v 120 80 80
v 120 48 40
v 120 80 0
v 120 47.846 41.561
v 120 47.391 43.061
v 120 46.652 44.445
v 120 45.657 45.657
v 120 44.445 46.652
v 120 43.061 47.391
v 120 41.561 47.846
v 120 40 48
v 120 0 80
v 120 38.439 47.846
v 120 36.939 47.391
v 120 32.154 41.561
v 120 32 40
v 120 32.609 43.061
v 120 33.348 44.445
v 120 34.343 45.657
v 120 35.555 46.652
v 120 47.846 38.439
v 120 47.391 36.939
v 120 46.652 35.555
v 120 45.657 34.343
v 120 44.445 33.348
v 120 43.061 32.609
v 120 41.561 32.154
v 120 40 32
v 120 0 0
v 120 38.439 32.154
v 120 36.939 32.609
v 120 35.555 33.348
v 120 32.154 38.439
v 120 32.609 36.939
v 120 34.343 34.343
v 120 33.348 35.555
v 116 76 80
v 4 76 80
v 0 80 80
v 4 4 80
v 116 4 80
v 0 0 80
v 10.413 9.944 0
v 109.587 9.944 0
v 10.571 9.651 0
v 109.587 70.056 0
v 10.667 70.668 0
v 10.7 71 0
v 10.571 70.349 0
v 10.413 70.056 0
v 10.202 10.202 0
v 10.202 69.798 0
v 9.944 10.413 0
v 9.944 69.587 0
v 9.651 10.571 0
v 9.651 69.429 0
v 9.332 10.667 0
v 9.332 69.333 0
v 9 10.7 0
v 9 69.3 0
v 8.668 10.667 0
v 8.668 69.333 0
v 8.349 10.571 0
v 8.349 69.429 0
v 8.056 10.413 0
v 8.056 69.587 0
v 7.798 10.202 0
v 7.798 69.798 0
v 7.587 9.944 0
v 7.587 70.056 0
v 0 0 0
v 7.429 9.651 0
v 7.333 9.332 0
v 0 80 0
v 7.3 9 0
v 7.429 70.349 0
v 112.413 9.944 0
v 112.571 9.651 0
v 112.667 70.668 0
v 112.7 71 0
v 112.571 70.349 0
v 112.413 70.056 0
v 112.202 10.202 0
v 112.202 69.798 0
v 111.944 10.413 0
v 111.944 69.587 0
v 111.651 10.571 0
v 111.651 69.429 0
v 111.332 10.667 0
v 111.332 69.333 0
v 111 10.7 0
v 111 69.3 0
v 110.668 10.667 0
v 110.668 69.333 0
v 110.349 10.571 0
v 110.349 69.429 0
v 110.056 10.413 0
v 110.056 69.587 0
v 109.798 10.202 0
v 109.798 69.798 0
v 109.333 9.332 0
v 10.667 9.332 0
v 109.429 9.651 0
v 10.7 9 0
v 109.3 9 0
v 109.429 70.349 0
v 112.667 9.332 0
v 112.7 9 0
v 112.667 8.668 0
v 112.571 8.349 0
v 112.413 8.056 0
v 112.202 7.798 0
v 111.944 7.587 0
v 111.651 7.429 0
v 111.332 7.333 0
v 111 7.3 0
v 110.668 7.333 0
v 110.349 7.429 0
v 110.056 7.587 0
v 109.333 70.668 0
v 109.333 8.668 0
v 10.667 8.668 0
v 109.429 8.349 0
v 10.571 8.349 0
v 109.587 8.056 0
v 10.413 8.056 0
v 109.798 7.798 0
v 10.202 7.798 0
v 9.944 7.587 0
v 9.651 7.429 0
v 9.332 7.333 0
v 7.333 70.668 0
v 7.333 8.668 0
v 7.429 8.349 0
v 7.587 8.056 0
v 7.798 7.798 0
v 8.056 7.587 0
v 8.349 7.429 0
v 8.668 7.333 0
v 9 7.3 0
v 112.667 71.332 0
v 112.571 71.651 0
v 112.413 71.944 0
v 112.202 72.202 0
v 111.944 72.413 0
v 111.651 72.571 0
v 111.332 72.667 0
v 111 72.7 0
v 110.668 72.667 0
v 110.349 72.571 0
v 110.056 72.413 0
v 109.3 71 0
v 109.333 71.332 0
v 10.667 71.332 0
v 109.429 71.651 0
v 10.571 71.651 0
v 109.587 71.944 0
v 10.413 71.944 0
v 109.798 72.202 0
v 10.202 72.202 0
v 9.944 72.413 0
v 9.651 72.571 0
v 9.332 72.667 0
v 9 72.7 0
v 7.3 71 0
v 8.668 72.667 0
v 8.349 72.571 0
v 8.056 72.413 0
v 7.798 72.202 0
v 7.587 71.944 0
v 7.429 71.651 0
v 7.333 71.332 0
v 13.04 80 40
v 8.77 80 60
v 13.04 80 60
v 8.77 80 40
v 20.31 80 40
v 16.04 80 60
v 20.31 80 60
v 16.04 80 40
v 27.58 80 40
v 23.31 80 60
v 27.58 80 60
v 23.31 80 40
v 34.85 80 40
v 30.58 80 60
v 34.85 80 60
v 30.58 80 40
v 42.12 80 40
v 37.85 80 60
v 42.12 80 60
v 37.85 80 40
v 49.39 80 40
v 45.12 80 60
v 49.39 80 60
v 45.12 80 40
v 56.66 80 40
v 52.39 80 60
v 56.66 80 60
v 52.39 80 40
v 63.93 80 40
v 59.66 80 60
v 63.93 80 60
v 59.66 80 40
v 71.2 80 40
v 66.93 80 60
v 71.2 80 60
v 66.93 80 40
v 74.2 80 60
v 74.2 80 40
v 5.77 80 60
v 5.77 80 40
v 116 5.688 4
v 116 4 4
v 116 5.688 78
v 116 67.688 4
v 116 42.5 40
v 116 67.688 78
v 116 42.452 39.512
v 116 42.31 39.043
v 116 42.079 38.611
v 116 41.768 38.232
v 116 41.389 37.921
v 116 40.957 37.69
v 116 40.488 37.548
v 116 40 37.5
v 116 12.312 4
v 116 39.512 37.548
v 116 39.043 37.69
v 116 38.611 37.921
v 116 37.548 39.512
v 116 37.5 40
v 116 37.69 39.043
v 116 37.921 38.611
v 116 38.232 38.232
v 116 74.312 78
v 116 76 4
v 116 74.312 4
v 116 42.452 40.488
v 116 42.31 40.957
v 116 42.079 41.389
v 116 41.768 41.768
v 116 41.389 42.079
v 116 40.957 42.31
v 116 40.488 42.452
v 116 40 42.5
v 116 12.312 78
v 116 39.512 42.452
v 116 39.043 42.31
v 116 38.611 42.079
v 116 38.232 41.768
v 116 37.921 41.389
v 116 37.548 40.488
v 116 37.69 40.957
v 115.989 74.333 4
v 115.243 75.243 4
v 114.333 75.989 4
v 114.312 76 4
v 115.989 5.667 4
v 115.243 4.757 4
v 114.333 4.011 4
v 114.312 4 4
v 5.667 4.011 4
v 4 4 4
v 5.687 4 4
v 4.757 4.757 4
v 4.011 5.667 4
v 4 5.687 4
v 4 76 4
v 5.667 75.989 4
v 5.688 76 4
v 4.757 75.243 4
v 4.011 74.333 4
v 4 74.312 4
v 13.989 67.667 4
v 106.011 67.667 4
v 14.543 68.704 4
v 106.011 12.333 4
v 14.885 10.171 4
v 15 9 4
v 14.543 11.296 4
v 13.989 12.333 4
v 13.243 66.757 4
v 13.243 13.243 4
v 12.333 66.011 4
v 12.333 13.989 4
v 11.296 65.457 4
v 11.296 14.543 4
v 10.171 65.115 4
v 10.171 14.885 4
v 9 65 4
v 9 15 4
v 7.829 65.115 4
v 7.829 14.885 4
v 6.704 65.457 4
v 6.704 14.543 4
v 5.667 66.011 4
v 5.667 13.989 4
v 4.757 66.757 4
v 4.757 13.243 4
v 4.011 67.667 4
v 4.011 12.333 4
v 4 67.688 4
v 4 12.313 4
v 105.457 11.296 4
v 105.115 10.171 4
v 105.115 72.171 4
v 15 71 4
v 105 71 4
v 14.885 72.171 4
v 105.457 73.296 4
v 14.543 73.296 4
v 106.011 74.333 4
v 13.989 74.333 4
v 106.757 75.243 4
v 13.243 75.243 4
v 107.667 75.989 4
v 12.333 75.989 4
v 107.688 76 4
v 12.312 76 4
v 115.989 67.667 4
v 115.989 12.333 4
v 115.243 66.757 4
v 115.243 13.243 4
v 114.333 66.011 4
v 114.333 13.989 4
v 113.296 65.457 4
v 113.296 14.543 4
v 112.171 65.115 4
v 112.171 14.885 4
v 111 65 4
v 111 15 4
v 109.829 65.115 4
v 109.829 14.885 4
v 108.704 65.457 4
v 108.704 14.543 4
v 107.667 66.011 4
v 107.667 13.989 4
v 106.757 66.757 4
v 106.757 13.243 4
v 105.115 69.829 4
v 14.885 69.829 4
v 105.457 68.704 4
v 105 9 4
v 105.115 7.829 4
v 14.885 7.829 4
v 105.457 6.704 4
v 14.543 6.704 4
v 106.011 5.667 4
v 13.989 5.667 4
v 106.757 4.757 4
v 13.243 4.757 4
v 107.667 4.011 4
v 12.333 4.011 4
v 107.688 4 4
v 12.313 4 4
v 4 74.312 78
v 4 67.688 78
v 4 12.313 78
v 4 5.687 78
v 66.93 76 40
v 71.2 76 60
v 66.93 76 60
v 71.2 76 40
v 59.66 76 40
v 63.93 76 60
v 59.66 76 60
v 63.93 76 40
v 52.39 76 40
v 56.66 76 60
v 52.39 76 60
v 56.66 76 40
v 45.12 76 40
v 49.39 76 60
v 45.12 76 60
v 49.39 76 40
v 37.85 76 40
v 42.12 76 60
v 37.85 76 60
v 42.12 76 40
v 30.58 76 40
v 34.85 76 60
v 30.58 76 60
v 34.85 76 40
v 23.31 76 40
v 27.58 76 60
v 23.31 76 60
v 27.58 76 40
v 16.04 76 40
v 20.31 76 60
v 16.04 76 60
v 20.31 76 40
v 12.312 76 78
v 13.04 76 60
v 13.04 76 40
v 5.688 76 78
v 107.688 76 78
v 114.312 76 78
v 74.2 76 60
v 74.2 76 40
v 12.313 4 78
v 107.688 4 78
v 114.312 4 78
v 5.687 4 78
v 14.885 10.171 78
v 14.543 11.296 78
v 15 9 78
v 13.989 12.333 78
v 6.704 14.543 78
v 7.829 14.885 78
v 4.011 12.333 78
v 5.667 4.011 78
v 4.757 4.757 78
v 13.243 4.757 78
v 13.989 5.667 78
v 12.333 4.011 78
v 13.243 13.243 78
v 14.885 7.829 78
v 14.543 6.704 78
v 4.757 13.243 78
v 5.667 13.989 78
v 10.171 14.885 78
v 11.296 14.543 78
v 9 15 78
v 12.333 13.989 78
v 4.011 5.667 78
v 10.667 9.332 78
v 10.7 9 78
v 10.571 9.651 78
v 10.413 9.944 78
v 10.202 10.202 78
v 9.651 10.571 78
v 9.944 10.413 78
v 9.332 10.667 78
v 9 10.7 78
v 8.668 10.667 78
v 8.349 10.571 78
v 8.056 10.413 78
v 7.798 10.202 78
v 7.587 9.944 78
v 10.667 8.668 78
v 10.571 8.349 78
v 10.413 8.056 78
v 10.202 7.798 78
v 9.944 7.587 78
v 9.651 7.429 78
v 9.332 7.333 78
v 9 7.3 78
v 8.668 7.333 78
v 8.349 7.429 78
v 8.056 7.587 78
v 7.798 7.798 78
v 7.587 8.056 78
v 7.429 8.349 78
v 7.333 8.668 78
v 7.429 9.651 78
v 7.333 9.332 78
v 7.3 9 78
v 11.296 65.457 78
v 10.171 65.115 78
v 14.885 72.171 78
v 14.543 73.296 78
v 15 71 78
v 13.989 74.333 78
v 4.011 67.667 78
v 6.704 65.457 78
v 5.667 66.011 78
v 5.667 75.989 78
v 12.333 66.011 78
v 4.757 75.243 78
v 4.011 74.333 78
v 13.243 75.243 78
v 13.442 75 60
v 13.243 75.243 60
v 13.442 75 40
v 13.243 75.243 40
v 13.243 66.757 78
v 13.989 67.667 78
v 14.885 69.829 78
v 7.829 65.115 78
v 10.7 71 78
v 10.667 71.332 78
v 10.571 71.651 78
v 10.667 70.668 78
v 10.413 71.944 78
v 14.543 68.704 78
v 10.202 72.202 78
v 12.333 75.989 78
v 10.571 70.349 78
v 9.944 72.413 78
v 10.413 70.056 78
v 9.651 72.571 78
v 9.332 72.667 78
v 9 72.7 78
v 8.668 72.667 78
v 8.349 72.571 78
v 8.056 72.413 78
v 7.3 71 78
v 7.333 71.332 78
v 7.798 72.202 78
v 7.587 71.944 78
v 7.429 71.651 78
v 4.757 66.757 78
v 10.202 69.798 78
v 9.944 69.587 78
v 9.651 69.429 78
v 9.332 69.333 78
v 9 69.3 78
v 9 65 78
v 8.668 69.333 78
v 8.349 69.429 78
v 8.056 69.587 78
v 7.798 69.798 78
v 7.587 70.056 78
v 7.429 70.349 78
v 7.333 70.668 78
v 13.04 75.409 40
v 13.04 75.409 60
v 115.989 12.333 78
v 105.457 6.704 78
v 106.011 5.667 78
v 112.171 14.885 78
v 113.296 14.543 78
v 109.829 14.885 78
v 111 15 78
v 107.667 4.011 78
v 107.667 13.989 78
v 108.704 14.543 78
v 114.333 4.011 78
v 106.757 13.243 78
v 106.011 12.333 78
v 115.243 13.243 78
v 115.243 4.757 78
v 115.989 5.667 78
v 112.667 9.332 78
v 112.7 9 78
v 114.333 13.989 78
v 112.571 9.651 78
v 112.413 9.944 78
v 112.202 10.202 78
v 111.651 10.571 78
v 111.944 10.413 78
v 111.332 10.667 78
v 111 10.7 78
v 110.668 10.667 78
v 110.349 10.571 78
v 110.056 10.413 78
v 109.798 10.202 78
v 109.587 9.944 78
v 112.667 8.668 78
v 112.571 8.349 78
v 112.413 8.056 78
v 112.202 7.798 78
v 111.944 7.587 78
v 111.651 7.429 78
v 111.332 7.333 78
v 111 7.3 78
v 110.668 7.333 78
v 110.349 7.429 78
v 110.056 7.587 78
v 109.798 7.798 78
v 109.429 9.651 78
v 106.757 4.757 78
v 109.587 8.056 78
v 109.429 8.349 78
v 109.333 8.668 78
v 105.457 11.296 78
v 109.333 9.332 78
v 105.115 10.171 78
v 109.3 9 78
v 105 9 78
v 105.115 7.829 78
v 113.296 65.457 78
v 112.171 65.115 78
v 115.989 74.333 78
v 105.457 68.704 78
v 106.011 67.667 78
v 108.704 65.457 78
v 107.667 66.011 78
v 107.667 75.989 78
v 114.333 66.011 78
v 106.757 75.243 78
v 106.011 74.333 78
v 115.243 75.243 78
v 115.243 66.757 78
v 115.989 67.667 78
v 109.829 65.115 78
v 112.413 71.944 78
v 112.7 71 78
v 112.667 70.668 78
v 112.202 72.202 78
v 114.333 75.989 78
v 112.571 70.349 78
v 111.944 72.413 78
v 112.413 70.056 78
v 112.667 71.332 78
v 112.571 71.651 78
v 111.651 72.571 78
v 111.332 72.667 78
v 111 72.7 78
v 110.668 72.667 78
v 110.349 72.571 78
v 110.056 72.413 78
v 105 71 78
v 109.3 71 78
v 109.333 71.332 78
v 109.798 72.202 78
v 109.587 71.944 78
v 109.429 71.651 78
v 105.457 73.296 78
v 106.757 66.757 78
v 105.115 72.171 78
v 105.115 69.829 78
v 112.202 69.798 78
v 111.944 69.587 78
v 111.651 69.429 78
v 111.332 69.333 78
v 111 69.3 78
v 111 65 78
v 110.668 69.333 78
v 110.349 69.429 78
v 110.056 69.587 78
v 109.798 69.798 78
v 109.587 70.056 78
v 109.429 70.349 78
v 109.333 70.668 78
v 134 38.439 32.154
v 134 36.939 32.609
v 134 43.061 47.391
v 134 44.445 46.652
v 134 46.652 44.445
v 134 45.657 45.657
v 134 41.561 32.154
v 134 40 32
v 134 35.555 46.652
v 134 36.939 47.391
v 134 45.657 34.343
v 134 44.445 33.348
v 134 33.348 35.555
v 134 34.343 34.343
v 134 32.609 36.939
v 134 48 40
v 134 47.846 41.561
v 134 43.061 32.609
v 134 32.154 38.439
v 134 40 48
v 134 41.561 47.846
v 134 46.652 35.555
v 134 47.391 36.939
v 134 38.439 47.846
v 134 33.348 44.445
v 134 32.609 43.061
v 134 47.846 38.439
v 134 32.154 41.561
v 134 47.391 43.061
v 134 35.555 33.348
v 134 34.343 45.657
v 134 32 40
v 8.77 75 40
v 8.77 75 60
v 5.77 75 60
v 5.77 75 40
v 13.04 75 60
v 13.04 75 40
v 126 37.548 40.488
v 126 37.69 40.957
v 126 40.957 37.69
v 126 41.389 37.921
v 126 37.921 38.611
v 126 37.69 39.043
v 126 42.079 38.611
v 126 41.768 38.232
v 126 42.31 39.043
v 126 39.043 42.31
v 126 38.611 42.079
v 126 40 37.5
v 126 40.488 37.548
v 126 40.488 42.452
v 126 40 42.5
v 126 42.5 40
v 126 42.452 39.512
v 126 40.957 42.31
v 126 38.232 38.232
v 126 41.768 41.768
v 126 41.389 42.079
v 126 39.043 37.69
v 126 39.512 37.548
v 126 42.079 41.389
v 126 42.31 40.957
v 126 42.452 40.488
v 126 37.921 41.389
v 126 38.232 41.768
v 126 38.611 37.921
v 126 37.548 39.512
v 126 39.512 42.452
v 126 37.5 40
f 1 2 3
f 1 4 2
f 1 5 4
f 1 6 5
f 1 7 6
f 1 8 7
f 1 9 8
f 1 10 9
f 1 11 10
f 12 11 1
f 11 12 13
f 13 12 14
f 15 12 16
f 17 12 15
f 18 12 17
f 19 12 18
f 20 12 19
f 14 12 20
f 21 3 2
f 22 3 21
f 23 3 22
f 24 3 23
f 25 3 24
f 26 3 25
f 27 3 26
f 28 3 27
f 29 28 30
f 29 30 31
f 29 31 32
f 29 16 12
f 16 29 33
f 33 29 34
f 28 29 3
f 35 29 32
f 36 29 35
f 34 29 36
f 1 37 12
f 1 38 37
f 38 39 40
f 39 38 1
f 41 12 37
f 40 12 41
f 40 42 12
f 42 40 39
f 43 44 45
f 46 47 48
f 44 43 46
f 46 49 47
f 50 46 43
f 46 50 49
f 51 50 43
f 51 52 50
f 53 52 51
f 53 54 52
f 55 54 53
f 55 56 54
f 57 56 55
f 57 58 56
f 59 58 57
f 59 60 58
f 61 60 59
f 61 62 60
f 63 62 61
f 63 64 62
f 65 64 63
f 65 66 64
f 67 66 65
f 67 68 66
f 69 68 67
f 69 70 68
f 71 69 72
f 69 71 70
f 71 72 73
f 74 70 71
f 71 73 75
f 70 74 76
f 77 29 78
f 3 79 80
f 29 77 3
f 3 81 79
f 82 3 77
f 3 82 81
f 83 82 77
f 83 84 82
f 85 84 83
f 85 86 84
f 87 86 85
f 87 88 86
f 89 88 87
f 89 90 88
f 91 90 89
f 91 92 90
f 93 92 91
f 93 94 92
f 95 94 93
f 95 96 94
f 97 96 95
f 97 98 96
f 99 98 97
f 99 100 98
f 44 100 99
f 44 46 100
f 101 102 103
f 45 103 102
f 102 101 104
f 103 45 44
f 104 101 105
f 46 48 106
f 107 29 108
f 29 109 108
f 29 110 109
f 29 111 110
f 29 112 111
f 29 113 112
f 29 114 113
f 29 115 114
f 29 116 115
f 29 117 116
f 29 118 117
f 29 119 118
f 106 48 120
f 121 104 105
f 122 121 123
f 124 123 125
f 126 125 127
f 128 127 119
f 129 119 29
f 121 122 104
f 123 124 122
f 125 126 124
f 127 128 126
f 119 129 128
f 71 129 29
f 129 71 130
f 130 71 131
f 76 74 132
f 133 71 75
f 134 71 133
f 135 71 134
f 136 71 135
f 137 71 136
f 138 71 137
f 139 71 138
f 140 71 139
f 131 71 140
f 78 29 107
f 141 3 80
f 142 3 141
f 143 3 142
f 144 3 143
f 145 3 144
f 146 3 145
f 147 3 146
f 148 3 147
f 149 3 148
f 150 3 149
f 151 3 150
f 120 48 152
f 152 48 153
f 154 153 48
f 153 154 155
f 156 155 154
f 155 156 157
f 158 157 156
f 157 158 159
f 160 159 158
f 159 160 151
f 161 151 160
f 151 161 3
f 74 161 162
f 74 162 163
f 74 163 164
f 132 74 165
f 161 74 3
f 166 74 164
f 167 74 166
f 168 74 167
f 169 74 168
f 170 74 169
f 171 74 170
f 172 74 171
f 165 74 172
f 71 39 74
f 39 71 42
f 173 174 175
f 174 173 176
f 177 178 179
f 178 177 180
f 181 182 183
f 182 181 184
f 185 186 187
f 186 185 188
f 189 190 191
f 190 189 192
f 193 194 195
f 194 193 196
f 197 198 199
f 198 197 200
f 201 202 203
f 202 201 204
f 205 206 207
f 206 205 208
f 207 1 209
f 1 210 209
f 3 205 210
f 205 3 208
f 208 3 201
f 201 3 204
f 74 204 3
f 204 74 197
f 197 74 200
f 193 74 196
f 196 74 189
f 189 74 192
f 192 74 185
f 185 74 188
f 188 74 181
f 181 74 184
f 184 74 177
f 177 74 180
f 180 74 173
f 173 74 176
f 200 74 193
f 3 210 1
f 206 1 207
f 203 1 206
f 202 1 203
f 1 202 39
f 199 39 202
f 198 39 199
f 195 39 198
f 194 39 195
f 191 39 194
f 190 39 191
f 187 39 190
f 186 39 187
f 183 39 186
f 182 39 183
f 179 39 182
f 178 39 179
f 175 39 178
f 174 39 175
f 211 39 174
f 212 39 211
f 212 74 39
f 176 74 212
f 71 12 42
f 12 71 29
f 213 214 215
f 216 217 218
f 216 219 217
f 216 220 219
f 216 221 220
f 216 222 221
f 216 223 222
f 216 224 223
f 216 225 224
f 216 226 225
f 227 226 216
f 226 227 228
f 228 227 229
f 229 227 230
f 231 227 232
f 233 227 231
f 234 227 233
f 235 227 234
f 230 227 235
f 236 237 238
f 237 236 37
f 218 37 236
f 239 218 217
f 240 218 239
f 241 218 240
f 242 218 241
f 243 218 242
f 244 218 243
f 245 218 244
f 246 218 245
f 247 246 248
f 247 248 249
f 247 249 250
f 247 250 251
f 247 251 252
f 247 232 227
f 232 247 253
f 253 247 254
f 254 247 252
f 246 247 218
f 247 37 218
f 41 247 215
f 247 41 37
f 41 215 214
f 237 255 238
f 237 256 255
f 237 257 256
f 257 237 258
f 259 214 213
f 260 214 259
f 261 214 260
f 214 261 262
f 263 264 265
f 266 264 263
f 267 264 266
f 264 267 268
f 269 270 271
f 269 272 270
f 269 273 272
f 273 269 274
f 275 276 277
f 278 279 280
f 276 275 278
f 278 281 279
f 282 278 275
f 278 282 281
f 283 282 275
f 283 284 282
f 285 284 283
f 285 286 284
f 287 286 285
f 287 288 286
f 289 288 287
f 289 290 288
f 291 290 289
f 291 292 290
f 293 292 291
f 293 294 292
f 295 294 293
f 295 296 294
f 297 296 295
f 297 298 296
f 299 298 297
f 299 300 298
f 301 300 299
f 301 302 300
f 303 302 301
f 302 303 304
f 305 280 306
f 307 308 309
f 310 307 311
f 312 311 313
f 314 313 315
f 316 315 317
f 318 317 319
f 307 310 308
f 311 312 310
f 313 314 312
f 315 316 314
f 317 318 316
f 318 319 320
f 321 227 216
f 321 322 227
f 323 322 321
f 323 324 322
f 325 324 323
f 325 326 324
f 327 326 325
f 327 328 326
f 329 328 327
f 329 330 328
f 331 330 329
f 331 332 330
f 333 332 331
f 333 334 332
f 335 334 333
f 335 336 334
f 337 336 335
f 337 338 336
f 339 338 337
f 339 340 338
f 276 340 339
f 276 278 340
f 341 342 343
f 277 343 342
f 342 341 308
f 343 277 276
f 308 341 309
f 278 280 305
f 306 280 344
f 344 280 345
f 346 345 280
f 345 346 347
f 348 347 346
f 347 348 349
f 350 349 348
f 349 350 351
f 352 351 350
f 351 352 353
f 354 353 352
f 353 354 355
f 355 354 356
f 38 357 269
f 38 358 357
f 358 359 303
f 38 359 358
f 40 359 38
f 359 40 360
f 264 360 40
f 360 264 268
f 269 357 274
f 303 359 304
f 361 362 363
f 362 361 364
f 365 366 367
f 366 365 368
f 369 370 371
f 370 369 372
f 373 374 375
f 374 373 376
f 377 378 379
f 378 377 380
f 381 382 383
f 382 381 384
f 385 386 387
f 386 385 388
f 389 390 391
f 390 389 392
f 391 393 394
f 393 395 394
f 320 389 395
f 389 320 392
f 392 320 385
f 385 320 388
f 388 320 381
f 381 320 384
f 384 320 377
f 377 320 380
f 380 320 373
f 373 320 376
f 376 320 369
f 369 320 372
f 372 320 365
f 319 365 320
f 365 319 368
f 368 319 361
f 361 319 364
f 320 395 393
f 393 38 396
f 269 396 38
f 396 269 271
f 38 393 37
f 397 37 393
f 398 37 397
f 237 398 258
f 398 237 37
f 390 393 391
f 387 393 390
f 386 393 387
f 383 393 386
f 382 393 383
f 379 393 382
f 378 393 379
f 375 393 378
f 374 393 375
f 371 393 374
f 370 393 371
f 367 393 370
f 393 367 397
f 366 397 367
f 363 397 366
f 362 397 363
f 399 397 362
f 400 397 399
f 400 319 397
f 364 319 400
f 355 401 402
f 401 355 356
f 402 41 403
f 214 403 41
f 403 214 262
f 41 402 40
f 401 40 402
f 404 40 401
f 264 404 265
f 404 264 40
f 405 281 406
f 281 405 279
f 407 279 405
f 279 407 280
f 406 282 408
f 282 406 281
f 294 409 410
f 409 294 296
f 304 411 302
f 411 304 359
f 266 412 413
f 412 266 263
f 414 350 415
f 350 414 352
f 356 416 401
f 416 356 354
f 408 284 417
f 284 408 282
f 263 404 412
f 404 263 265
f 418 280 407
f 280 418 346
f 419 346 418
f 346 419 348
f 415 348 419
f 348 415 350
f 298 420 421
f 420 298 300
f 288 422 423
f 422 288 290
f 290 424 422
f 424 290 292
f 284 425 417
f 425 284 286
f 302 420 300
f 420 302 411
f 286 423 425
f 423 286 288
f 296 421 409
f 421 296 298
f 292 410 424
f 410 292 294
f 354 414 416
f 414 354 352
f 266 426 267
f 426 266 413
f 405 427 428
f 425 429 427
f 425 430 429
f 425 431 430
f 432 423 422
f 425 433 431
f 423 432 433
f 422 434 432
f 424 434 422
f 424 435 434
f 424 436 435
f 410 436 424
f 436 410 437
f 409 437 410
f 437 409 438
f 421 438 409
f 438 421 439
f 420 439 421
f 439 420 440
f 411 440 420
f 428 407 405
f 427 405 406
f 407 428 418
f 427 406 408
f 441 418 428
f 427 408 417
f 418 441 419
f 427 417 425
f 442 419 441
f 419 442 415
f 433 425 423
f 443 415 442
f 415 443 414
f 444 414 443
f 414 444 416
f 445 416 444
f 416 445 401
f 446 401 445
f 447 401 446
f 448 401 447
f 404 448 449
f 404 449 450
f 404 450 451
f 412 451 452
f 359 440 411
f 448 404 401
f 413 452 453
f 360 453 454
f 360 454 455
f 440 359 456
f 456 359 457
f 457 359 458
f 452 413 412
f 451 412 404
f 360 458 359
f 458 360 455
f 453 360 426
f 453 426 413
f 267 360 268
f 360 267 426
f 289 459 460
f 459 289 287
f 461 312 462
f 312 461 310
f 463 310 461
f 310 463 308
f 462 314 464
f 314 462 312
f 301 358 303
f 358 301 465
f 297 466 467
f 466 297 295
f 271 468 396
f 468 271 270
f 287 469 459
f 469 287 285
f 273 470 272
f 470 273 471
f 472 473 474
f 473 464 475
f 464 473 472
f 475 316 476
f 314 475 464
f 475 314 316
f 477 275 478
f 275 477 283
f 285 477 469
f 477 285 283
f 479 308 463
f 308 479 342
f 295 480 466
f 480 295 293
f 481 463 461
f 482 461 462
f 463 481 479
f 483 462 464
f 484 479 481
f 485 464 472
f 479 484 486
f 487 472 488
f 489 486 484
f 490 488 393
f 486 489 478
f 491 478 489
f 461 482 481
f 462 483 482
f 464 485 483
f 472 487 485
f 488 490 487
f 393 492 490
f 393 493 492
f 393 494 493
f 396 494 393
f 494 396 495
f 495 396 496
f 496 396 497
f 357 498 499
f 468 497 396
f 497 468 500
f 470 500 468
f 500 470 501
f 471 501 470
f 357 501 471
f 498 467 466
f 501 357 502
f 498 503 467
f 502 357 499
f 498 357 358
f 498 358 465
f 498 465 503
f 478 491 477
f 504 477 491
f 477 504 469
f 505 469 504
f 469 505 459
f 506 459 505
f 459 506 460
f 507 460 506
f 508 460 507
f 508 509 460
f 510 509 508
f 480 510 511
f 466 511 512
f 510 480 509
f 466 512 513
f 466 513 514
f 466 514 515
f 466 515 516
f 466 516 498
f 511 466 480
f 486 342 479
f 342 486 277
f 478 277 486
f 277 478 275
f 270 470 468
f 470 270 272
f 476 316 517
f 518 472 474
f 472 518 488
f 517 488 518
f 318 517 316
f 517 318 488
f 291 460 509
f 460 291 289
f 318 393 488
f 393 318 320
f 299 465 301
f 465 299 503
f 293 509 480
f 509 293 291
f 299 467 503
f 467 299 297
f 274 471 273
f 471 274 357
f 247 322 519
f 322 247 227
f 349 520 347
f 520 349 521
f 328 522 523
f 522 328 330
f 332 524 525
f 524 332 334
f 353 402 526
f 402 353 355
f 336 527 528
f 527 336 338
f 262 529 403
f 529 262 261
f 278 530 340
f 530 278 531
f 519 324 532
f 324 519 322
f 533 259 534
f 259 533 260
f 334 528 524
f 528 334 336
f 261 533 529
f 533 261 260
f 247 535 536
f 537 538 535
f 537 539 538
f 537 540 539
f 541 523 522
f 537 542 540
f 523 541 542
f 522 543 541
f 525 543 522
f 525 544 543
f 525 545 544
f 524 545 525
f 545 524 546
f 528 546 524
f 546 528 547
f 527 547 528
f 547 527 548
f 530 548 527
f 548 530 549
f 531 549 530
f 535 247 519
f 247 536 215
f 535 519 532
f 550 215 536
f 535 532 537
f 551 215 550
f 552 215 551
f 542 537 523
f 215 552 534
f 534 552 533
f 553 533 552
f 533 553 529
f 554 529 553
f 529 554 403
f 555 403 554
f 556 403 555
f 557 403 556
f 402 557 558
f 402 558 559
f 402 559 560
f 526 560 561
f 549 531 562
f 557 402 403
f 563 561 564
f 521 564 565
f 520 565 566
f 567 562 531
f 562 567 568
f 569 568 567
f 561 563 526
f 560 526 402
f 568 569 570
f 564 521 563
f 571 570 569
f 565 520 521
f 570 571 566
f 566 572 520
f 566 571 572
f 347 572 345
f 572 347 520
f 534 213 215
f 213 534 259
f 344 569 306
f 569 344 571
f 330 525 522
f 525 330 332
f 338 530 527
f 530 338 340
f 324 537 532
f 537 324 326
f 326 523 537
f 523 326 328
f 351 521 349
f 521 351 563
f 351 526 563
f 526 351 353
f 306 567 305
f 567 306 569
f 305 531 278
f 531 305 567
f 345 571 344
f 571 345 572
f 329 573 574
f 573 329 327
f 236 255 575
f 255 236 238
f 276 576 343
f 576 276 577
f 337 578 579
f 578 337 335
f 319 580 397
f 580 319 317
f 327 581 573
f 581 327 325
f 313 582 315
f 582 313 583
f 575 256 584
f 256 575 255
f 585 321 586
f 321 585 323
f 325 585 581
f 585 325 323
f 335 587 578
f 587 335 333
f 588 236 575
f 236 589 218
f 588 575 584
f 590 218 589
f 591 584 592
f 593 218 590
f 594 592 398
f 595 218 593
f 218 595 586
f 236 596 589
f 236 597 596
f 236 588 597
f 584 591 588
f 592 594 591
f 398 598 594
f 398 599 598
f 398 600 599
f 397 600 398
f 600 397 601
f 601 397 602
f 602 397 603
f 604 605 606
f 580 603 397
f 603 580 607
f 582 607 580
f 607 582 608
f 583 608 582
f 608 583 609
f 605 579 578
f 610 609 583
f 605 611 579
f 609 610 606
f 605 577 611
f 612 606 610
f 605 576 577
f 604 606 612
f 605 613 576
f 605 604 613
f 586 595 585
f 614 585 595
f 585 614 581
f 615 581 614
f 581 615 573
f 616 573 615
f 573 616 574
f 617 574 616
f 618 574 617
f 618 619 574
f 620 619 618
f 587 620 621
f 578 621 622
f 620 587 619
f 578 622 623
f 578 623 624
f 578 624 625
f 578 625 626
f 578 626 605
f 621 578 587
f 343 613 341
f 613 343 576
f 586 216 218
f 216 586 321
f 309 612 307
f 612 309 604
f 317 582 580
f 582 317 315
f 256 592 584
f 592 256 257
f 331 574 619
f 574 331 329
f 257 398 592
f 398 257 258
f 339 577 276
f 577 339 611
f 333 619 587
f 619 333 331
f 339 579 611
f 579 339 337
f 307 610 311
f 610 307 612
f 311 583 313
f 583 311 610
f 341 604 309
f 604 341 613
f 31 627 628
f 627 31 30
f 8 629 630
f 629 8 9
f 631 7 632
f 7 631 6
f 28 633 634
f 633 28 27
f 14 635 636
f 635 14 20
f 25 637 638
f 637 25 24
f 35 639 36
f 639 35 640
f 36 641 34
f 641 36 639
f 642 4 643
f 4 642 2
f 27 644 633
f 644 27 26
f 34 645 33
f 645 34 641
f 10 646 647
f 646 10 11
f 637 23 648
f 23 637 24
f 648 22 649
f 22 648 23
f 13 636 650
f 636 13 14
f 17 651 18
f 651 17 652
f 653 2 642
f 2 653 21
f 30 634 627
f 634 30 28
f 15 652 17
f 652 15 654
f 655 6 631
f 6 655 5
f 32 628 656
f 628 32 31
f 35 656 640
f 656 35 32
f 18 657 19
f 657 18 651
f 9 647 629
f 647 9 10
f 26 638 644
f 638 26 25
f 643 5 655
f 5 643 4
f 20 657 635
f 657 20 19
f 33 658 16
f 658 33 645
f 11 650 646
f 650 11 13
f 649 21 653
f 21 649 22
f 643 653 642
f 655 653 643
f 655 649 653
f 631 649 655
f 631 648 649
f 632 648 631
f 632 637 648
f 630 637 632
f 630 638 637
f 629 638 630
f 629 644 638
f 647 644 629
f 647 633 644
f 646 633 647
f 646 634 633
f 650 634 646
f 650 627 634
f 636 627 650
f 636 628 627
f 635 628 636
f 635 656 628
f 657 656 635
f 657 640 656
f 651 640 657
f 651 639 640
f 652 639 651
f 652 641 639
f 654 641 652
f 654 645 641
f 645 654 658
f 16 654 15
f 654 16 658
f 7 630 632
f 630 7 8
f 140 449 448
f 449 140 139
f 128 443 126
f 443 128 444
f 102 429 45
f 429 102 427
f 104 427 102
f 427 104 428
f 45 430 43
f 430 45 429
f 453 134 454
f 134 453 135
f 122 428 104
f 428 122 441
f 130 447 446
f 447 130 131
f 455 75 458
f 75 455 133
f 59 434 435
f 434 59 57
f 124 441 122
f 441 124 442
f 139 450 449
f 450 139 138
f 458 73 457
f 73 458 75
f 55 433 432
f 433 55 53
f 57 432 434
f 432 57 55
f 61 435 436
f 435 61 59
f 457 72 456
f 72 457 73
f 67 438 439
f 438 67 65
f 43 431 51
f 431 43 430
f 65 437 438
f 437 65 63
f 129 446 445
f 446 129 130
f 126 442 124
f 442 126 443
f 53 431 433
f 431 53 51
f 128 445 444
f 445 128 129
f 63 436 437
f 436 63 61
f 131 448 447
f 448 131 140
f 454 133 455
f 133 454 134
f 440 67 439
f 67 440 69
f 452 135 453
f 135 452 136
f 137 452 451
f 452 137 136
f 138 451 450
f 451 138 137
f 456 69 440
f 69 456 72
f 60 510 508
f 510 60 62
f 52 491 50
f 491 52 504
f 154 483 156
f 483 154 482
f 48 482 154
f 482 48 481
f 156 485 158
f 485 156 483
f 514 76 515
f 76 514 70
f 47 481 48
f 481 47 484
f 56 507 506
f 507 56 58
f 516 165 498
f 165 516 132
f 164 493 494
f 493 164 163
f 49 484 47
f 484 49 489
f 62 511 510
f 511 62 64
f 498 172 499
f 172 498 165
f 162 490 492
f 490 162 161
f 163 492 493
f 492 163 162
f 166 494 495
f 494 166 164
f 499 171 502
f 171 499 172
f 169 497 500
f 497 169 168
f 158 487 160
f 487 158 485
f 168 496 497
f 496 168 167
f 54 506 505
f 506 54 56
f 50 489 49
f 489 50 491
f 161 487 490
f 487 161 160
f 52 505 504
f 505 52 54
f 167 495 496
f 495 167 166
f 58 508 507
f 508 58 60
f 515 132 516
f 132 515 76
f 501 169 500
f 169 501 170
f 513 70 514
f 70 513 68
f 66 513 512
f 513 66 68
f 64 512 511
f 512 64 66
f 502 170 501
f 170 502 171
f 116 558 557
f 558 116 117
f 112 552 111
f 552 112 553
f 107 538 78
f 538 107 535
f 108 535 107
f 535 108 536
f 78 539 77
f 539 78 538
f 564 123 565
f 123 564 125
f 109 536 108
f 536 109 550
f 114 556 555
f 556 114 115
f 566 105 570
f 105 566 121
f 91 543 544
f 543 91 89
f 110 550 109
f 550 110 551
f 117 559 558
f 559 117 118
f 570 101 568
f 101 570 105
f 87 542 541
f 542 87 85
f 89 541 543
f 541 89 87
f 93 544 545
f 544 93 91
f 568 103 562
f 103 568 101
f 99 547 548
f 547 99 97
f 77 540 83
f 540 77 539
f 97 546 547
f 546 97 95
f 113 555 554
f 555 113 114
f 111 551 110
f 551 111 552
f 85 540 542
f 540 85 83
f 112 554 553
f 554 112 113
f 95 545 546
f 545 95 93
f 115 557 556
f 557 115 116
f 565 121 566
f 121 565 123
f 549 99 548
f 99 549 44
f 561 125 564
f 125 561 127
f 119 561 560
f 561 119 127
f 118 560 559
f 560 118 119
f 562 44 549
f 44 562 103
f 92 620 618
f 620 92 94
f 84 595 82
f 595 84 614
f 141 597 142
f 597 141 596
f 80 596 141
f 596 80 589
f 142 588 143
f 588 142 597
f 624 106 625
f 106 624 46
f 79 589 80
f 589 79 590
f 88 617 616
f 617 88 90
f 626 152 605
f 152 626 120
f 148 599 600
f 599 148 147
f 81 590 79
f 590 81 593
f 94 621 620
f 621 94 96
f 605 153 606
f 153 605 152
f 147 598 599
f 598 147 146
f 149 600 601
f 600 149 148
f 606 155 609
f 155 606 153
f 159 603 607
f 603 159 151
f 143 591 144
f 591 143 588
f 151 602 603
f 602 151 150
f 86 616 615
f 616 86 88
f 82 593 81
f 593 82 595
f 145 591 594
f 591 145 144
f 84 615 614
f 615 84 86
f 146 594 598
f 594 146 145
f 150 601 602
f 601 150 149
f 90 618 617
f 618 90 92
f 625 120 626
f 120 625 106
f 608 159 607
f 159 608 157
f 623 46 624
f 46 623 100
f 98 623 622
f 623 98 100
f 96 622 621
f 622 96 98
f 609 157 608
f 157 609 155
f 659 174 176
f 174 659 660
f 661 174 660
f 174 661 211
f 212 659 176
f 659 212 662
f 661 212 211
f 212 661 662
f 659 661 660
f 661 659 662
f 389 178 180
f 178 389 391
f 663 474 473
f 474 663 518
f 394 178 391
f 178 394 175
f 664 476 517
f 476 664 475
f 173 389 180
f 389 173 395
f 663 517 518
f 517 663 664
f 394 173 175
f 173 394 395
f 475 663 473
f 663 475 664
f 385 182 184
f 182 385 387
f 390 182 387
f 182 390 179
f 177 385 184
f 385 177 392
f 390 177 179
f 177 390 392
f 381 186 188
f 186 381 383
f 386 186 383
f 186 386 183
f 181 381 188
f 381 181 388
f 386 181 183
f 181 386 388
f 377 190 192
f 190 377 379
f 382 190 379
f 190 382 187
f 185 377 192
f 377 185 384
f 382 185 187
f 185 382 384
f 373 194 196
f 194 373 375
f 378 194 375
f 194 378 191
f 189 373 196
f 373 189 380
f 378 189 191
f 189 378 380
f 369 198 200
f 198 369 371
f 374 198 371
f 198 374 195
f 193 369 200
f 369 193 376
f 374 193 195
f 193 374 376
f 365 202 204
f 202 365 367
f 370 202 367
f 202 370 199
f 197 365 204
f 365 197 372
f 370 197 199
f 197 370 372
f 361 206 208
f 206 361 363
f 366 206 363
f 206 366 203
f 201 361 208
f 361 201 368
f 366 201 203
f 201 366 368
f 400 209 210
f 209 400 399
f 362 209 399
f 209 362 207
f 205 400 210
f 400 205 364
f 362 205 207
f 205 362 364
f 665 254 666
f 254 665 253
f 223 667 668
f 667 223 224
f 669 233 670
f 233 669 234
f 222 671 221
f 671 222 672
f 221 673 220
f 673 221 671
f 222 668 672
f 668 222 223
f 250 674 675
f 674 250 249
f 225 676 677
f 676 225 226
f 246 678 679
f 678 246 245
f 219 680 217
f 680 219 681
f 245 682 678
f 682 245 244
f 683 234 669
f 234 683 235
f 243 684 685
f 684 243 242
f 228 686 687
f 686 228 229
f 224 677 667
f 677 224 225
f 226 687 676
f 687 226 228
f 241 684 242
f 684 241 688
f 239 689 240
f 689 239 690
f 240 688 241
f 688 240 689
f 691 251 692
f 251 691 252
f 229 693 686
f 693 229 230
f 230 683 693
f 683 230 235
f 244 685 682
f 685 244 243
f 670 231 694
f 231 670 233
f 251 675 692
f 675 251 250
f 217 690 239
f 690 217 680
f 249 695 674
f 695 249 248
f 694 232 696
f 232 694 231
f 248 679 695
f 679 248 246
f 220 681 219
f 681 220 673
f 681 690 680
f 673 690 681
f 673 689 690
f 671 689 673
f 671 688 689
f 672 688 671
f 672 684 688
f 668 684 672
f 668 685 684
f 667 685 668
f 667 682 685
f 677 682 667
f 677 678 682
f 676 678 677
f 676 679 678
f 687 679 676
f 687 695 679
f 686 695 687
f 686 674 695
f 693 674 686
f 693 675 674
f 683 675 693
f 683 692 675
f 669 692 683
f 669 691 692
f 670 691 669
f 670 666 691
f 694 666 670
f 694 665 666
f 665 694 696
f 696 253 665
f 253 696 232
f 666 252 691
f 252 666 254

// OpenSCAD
$fn = 32;

// ----------------------------------------------------------------------
// Enclosure body: 120 x 80 x 80 mm, wall 4 mm
// ----------------------------------------------------------------------

// --- parameters (mm) ---
length = 120;             // outside length, X
width = 80;               // outside width, Y
height = 80;              // outside height, Z
wall = 4;                 // side wall thickness
floor_t = 4;              // floor thickness
boss_d = 12;              // corner boss diameter
boss_h = 74;              // corner boss height above the floor
boss_hole_d = 3.4;        // lid screw clearance in the boss
boss_lip = 9;             // boss centre inset from the corner
vent_slots = 10;          // vent slots in the long wall
vent_w = 3;               // vent slot width
vent_h = 20;              // vent slot height
vent_pitch = 7.27;        // vent slot pitch
vent_z = 40;              // vent slot sill height
nipple_d = 16;            // cable gland boss diameter
nipple_h = 14;            // cable gland boss height
nipple_bore = 5;          // cable gland bore

module shell() {
  difference() {
    cube([length, width, height]);
    /* hollow, open at the top */
    translate([wall, wall, floor_t])
      cube([length - 2 * wall, width - 2 * wall, height]);
  }
}

module bosses() {
  /* corner bosses, sunk 1 mm into the floor */
  for (sx = [0, 1]) for (sy = [0, 1])
    translate([sx * (length - 2 * boss_lip) + boss_lip, sy * (width - 2 * boss_lip) + boss_lip, floor_t - 1])
      cylinder(h = boss_h + 1, d = boss_d);
}

module gland() {
  /* boss on the short wall, sunk 1 mm into it */
  translate([length - 1, width / 2, height * 0.5]) rotate([0, 90, 0])
    cylinder(h = nipple_h + 1, d = nipple_d);
}

difference() {
  union() {
    shell();
    bosses();
    gland();
  }
  /* boss screw holes */
  for (sx = [0, 1]) for (sy = [0, 1])
    translate([sx * (length - 2 * boss_lip) + boss_lip, sy * (width - 2 * boss_lip) + boss_lip, -1]) cylinder(h = floor_t + boss_h + 2, d = boss_hole_d);
  /* vent grille in the +Y wall */
  for (i = [0 : vent_slots - 1]) translate([vent_pitch * (i + 1) - vent_w / 2, width - wall - 1, vent_z]) cube([vent_w, wall + 2, vent_h]);
  translate([length, width / 2, height * 0.5]) rotate([0, 90, 0]) translate([0, 0, -nipple_h - 2]) cylinder(h = nipple_h + wall + 4, d = nipple_bore);
}
